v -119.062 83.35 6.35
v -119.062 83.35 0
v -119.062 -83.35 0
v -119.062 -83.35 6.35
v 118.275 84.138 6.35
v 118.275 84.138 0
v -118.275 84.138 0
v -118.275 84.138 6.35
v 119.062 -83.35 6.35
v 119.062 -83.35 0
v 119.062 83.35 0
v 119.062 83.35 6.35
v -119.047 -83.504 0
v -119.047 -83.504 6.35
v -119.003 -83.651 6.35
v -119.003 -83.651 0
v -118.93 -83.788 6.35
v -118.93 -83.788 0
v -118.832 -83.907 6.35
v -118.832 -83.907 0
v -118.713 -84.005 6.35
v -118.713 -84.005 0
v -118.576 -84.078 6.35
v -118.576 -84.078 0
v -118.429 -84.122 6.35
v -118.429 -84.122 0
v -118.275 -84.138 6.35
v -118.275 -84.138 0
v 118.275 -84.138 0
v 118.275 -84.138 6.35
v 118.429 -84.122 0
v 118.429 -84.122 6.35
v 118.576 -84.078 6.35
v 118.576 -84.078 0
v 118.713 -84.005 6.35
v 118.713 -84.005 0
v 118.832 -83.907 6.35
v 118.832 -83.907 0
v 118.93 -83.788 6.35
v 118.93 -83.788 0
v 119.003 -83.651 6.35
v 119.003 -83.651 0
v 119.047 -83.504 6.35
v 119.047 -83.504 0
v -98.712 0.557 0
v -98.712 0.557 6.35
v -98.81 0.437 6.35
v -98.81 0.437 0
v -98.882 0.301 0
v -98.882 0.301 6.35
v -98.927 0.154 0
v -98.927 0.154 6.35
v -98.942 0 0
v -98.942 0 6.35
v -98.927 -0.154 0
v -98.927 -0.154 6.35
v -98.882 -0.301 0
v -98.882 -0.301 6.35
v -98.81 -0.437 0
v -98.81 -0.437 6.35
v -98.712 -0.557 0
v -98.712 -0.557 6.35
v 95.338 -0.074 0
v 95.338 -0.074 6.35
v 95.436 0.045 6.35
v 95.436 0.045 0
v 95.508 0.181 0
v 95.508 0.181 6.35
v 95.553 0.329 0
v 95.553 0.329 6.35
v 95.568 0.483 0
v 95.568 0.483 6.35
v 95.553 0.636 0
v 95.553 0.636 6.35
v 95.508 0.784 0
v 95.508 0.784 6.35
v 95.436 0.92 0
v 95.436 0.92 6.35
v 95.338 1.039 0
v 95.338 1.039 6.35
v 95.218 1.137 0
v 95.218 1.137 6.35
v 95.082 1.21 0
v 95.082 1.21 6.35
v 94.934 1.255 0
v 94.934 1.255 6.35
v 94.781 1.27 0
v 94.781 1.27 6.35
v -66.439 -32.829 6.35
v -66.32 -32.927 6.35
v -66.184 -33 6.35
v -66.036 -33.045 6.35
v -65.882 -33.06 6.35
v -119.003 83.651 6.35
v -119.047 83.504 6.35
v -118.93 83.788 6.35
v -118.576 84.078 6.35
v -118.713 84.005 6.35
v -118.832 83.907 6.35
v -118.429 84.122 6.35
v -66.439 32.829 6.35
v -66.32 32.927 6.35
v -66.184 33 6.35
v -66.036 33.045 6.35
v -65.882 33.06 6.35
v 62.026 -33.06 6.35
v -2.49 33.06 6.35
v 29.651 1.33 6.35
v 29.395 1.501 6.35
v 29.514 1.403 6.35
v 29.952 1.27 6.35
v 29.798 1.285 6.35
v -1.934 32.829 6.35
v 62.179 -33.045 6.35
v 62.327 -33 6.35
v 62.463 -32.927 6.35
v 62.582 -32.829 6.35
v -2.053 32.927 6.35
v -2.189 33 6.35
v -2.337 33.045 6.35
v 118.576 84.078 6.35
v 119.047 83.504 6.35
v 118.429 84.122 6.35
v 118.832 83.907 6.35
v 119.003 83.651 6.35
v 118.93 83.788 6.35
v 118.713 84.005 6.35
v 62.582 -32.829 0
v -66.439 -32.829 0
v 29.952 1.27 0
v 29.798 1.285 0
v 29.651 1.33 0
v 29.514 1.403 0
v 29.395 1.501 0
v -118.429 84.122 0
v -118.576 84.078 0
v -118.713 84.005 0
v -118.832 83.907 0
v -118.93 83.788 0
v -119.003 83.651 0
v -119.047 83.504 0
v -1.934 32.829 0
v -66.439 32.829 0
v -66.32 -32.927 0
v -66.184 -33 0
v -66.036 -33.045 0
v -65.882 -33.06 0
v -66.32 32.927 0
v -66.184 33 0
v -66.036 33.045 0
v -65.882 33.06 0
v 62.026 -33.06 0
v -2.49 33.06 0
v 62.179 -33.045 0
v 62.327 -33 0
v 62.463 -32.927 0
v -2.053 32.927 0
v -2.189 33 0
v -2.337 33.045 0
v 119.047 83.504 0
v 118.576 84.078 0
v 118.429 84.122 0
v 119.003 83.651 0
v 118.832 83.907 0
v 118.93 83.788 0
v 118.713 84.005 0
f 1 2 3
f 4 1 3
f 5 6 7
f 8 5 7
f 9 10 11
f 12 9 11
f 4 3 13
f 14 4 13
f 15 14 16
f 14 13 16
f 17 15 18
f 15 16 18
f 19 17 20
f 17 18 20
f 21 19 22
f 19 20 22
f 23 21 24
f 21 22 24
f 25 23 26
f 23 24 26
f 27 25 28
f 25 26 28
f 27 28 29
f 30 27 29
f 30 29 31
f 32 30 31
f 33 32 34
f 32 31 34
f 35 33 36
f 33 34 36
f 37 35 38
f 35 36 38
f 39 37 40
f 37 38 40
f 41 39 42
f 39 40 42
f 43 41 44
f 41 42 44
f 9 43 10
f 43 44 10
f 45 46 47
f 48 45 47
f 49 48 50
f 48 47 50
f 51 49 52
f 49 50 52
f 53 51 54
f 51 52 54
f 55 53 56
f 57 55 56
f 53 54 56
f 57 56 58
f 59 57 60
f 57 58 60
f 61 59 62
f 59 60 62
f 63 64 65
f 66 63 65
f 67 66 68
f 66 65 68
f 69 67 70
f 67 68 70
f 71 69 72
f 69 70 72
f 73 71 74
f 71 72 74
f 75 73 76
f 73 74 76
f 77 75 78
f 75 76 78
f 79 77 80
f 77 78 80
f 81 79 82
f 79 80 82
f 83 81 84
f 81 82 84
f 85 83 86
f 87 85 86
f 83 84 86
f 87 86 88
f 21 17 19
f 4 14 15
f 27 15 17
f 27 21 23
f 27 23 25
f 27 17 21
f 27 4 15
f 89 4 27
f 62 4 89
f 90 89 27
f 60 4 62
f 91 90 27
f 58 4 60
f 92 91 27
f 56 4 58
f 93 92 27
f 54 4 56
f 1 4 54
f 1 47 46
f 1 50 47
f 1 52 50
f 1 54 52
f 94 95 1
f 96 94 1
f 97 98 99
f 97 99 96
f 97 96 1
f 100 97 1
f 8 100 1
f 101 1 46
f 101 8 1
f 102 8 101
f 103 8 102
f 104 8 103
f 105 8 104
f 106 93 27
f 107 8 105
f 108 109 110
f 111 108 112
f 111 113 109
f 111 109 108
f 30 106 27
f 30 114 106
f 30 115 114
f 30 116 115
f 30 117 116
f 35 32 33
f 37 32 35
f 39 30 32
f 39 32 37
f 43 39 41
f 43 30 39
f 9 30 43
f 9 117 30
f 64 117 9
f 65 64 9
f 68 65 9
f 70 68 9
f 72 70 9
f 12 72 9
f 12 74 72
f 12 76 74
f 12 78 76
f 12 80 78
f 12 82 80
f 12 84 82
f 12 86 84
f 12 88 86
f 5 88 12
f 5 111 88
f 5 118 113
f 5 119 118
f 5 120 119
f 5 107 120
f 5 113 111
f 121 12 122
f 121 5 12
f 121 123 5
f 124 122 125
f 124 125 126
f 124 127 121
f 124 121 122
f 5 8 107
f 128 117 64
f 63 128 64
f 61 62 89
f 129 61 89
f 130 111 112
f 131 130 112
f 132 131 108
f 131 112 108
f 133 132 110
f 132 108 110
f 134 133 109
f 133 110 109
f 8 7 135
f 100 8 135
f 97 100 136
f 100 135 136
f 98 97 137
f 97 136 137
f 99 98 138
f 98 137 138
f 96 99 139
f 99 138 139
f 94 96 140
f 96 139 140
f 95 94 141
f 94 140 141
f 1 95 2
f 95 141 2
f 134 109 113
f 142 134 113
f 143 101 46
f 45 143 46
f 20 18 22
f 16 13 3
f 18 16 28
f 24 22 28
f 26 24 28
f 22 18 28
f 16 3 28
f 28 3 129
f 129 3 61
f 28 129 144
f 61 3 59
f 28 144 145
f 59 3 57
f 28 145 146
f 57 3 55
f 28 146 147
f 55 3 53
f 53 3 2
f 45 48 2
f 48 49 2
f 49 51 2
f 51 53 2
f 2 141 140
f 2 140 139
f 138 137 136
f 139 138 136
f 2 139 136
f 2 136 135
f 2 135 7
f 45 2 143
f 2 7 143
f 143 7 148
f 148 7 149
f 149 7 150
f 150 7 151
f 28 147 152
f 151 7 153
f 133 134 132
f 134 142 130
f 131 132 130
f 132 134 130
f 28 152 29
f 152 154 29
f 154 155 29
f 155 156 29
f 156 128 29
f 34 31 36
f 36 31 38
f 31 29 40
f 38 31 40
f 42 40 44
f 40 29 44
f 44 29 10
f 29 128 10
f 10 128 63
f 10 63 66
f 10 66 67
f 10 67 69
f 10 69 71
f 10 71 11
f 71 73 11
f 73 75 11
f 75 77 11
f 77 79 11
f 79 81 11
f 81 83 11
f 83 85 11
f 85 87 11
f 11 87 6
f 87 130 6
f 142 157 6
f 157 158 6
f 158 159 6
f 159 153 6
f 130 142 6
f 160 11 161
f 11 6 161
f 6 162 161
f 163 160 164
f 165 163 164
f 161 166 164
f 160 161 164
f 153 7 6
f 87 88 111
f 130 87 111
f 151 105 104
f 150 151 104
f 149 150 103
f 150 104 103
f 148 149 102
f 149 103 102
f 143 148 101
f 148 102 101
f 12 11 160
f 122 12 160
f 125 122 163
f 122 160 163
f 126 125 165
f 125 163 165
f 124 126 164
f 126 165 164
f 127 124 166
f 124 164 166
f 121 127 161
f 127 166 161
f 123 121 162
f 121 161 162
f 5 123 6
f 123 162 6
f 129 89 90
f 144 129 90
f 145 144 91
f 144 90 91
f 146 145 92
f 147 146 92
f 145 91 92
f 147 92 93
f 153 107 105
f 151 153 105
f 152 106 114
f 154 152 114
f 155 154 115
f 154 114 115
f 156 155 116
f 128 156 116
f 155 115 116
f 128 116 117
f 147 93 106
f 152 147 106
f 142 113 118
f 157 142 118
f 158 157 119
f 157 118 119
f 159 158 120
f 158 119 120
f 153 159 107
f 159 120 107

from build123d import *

# Parameters (mm, degrees)
F1_DEPTH = 6.35
F3_DEPTH = 25.4
F5_DEPTH = 25.4


with BuildPart() as f1:
    # F0 (on Top) → F1 (new body)
    with BuildSketch(Plane.XY):
        with BuildLine():
            Line((118.2751, 84.1375), (-118.2751, 84.1375))
            ThreePointArc((-118.2751, 84.1375), (-118.831876, 83.906876), (-119.0625, 83.3501))
            Line((-119.0625, 83.3501), (-119.0625, -83.3501))
            ThreePointArc((-119.0625, -83.3501), (-118.831876, -83.906876), (-118.2751, -84.1375))
            Line((-118.2751, -84.1375), (118.2751, -84.1375))
            ThreePointArc((118.2751, -84.1375), (118.831876, -83.906876), (119.0625, -83.3501))
            Line((119.0625, -83.3501), (119.0625, 83.3501))
            ThreePointArc((119.0625, 83.3501), (118.831876, 83.906876), (118.2751, 84.1375))
        make_face()
    extrude(amount=F1_DEPTH)

    # F2 (on face) → F3 (cut)
    with BuildSketch(Plane.XY.offset(6.35)):
        Polygon((-2.690393, 31.790107), (-65.682393, 31.790107), (-97.4725, 0), (-65.682393, -31.790107), (61.825607, -31.790107), (93.615713, 0), (29.099713, 0), align=None)
    extrude(amount=-F3_DEPTH, mode=Mode.SUBTRACT)

    # F4 (on face) → F5 (cut)
    with BuildSketch(Plane.XY.offset(6.35)):
        with BuildLine():
            ThreePointArc((29.951916, 1.27), (29.650591, 1.329937), (29.39514, 1.500624))
            Line((29.39514, 1.500624), (-1.933718, 32.829483))
            ThreePointArc((-1.933718, 32.829483), (-2.189169, 33.000169), (-2.490494, 33.060107))
            Line((-2.490494, 33.060107), (-65.882293, 33.060107))
            ThreePointArc((-65.882293, 33.060107), (-66.183618, 33.000169), (-66.439069, 32.829483))
            Line((-66.439069, 32.829483), (-98.711775, 0.556776))
            ThreePointArc((-98.711775, 0.556776), (-98.942399, 0), (-98.711775, -0.556776))
            Line((-98.711775, -0.556776), (-66.439069, -32.829483))
            ThreePointArc((-66.439069, -32.829483), (-66.183618, -33.000169), (-65.882293, -33.060107))
            Line((-65.882293, -33.060107), (62.025506, -33.060107))
            ThreePointArc((62.025506, -33.060107), (62.326831, -33.000169), (62.582282, -32.829483))
            Line((62.582282, -32.829483), (95.337589, -0.074176))
            ThreePointArc((95.337589, -0.074176), (95.508276, 0.783925), (94.780813, 1.27))
            Line((94.780813, 1.27), (29.951916, 1.27))
        make_face()
    extrude(amount=-F5_DEPTH, mode=Mode.SUBTRACT)


solid = f1.part
